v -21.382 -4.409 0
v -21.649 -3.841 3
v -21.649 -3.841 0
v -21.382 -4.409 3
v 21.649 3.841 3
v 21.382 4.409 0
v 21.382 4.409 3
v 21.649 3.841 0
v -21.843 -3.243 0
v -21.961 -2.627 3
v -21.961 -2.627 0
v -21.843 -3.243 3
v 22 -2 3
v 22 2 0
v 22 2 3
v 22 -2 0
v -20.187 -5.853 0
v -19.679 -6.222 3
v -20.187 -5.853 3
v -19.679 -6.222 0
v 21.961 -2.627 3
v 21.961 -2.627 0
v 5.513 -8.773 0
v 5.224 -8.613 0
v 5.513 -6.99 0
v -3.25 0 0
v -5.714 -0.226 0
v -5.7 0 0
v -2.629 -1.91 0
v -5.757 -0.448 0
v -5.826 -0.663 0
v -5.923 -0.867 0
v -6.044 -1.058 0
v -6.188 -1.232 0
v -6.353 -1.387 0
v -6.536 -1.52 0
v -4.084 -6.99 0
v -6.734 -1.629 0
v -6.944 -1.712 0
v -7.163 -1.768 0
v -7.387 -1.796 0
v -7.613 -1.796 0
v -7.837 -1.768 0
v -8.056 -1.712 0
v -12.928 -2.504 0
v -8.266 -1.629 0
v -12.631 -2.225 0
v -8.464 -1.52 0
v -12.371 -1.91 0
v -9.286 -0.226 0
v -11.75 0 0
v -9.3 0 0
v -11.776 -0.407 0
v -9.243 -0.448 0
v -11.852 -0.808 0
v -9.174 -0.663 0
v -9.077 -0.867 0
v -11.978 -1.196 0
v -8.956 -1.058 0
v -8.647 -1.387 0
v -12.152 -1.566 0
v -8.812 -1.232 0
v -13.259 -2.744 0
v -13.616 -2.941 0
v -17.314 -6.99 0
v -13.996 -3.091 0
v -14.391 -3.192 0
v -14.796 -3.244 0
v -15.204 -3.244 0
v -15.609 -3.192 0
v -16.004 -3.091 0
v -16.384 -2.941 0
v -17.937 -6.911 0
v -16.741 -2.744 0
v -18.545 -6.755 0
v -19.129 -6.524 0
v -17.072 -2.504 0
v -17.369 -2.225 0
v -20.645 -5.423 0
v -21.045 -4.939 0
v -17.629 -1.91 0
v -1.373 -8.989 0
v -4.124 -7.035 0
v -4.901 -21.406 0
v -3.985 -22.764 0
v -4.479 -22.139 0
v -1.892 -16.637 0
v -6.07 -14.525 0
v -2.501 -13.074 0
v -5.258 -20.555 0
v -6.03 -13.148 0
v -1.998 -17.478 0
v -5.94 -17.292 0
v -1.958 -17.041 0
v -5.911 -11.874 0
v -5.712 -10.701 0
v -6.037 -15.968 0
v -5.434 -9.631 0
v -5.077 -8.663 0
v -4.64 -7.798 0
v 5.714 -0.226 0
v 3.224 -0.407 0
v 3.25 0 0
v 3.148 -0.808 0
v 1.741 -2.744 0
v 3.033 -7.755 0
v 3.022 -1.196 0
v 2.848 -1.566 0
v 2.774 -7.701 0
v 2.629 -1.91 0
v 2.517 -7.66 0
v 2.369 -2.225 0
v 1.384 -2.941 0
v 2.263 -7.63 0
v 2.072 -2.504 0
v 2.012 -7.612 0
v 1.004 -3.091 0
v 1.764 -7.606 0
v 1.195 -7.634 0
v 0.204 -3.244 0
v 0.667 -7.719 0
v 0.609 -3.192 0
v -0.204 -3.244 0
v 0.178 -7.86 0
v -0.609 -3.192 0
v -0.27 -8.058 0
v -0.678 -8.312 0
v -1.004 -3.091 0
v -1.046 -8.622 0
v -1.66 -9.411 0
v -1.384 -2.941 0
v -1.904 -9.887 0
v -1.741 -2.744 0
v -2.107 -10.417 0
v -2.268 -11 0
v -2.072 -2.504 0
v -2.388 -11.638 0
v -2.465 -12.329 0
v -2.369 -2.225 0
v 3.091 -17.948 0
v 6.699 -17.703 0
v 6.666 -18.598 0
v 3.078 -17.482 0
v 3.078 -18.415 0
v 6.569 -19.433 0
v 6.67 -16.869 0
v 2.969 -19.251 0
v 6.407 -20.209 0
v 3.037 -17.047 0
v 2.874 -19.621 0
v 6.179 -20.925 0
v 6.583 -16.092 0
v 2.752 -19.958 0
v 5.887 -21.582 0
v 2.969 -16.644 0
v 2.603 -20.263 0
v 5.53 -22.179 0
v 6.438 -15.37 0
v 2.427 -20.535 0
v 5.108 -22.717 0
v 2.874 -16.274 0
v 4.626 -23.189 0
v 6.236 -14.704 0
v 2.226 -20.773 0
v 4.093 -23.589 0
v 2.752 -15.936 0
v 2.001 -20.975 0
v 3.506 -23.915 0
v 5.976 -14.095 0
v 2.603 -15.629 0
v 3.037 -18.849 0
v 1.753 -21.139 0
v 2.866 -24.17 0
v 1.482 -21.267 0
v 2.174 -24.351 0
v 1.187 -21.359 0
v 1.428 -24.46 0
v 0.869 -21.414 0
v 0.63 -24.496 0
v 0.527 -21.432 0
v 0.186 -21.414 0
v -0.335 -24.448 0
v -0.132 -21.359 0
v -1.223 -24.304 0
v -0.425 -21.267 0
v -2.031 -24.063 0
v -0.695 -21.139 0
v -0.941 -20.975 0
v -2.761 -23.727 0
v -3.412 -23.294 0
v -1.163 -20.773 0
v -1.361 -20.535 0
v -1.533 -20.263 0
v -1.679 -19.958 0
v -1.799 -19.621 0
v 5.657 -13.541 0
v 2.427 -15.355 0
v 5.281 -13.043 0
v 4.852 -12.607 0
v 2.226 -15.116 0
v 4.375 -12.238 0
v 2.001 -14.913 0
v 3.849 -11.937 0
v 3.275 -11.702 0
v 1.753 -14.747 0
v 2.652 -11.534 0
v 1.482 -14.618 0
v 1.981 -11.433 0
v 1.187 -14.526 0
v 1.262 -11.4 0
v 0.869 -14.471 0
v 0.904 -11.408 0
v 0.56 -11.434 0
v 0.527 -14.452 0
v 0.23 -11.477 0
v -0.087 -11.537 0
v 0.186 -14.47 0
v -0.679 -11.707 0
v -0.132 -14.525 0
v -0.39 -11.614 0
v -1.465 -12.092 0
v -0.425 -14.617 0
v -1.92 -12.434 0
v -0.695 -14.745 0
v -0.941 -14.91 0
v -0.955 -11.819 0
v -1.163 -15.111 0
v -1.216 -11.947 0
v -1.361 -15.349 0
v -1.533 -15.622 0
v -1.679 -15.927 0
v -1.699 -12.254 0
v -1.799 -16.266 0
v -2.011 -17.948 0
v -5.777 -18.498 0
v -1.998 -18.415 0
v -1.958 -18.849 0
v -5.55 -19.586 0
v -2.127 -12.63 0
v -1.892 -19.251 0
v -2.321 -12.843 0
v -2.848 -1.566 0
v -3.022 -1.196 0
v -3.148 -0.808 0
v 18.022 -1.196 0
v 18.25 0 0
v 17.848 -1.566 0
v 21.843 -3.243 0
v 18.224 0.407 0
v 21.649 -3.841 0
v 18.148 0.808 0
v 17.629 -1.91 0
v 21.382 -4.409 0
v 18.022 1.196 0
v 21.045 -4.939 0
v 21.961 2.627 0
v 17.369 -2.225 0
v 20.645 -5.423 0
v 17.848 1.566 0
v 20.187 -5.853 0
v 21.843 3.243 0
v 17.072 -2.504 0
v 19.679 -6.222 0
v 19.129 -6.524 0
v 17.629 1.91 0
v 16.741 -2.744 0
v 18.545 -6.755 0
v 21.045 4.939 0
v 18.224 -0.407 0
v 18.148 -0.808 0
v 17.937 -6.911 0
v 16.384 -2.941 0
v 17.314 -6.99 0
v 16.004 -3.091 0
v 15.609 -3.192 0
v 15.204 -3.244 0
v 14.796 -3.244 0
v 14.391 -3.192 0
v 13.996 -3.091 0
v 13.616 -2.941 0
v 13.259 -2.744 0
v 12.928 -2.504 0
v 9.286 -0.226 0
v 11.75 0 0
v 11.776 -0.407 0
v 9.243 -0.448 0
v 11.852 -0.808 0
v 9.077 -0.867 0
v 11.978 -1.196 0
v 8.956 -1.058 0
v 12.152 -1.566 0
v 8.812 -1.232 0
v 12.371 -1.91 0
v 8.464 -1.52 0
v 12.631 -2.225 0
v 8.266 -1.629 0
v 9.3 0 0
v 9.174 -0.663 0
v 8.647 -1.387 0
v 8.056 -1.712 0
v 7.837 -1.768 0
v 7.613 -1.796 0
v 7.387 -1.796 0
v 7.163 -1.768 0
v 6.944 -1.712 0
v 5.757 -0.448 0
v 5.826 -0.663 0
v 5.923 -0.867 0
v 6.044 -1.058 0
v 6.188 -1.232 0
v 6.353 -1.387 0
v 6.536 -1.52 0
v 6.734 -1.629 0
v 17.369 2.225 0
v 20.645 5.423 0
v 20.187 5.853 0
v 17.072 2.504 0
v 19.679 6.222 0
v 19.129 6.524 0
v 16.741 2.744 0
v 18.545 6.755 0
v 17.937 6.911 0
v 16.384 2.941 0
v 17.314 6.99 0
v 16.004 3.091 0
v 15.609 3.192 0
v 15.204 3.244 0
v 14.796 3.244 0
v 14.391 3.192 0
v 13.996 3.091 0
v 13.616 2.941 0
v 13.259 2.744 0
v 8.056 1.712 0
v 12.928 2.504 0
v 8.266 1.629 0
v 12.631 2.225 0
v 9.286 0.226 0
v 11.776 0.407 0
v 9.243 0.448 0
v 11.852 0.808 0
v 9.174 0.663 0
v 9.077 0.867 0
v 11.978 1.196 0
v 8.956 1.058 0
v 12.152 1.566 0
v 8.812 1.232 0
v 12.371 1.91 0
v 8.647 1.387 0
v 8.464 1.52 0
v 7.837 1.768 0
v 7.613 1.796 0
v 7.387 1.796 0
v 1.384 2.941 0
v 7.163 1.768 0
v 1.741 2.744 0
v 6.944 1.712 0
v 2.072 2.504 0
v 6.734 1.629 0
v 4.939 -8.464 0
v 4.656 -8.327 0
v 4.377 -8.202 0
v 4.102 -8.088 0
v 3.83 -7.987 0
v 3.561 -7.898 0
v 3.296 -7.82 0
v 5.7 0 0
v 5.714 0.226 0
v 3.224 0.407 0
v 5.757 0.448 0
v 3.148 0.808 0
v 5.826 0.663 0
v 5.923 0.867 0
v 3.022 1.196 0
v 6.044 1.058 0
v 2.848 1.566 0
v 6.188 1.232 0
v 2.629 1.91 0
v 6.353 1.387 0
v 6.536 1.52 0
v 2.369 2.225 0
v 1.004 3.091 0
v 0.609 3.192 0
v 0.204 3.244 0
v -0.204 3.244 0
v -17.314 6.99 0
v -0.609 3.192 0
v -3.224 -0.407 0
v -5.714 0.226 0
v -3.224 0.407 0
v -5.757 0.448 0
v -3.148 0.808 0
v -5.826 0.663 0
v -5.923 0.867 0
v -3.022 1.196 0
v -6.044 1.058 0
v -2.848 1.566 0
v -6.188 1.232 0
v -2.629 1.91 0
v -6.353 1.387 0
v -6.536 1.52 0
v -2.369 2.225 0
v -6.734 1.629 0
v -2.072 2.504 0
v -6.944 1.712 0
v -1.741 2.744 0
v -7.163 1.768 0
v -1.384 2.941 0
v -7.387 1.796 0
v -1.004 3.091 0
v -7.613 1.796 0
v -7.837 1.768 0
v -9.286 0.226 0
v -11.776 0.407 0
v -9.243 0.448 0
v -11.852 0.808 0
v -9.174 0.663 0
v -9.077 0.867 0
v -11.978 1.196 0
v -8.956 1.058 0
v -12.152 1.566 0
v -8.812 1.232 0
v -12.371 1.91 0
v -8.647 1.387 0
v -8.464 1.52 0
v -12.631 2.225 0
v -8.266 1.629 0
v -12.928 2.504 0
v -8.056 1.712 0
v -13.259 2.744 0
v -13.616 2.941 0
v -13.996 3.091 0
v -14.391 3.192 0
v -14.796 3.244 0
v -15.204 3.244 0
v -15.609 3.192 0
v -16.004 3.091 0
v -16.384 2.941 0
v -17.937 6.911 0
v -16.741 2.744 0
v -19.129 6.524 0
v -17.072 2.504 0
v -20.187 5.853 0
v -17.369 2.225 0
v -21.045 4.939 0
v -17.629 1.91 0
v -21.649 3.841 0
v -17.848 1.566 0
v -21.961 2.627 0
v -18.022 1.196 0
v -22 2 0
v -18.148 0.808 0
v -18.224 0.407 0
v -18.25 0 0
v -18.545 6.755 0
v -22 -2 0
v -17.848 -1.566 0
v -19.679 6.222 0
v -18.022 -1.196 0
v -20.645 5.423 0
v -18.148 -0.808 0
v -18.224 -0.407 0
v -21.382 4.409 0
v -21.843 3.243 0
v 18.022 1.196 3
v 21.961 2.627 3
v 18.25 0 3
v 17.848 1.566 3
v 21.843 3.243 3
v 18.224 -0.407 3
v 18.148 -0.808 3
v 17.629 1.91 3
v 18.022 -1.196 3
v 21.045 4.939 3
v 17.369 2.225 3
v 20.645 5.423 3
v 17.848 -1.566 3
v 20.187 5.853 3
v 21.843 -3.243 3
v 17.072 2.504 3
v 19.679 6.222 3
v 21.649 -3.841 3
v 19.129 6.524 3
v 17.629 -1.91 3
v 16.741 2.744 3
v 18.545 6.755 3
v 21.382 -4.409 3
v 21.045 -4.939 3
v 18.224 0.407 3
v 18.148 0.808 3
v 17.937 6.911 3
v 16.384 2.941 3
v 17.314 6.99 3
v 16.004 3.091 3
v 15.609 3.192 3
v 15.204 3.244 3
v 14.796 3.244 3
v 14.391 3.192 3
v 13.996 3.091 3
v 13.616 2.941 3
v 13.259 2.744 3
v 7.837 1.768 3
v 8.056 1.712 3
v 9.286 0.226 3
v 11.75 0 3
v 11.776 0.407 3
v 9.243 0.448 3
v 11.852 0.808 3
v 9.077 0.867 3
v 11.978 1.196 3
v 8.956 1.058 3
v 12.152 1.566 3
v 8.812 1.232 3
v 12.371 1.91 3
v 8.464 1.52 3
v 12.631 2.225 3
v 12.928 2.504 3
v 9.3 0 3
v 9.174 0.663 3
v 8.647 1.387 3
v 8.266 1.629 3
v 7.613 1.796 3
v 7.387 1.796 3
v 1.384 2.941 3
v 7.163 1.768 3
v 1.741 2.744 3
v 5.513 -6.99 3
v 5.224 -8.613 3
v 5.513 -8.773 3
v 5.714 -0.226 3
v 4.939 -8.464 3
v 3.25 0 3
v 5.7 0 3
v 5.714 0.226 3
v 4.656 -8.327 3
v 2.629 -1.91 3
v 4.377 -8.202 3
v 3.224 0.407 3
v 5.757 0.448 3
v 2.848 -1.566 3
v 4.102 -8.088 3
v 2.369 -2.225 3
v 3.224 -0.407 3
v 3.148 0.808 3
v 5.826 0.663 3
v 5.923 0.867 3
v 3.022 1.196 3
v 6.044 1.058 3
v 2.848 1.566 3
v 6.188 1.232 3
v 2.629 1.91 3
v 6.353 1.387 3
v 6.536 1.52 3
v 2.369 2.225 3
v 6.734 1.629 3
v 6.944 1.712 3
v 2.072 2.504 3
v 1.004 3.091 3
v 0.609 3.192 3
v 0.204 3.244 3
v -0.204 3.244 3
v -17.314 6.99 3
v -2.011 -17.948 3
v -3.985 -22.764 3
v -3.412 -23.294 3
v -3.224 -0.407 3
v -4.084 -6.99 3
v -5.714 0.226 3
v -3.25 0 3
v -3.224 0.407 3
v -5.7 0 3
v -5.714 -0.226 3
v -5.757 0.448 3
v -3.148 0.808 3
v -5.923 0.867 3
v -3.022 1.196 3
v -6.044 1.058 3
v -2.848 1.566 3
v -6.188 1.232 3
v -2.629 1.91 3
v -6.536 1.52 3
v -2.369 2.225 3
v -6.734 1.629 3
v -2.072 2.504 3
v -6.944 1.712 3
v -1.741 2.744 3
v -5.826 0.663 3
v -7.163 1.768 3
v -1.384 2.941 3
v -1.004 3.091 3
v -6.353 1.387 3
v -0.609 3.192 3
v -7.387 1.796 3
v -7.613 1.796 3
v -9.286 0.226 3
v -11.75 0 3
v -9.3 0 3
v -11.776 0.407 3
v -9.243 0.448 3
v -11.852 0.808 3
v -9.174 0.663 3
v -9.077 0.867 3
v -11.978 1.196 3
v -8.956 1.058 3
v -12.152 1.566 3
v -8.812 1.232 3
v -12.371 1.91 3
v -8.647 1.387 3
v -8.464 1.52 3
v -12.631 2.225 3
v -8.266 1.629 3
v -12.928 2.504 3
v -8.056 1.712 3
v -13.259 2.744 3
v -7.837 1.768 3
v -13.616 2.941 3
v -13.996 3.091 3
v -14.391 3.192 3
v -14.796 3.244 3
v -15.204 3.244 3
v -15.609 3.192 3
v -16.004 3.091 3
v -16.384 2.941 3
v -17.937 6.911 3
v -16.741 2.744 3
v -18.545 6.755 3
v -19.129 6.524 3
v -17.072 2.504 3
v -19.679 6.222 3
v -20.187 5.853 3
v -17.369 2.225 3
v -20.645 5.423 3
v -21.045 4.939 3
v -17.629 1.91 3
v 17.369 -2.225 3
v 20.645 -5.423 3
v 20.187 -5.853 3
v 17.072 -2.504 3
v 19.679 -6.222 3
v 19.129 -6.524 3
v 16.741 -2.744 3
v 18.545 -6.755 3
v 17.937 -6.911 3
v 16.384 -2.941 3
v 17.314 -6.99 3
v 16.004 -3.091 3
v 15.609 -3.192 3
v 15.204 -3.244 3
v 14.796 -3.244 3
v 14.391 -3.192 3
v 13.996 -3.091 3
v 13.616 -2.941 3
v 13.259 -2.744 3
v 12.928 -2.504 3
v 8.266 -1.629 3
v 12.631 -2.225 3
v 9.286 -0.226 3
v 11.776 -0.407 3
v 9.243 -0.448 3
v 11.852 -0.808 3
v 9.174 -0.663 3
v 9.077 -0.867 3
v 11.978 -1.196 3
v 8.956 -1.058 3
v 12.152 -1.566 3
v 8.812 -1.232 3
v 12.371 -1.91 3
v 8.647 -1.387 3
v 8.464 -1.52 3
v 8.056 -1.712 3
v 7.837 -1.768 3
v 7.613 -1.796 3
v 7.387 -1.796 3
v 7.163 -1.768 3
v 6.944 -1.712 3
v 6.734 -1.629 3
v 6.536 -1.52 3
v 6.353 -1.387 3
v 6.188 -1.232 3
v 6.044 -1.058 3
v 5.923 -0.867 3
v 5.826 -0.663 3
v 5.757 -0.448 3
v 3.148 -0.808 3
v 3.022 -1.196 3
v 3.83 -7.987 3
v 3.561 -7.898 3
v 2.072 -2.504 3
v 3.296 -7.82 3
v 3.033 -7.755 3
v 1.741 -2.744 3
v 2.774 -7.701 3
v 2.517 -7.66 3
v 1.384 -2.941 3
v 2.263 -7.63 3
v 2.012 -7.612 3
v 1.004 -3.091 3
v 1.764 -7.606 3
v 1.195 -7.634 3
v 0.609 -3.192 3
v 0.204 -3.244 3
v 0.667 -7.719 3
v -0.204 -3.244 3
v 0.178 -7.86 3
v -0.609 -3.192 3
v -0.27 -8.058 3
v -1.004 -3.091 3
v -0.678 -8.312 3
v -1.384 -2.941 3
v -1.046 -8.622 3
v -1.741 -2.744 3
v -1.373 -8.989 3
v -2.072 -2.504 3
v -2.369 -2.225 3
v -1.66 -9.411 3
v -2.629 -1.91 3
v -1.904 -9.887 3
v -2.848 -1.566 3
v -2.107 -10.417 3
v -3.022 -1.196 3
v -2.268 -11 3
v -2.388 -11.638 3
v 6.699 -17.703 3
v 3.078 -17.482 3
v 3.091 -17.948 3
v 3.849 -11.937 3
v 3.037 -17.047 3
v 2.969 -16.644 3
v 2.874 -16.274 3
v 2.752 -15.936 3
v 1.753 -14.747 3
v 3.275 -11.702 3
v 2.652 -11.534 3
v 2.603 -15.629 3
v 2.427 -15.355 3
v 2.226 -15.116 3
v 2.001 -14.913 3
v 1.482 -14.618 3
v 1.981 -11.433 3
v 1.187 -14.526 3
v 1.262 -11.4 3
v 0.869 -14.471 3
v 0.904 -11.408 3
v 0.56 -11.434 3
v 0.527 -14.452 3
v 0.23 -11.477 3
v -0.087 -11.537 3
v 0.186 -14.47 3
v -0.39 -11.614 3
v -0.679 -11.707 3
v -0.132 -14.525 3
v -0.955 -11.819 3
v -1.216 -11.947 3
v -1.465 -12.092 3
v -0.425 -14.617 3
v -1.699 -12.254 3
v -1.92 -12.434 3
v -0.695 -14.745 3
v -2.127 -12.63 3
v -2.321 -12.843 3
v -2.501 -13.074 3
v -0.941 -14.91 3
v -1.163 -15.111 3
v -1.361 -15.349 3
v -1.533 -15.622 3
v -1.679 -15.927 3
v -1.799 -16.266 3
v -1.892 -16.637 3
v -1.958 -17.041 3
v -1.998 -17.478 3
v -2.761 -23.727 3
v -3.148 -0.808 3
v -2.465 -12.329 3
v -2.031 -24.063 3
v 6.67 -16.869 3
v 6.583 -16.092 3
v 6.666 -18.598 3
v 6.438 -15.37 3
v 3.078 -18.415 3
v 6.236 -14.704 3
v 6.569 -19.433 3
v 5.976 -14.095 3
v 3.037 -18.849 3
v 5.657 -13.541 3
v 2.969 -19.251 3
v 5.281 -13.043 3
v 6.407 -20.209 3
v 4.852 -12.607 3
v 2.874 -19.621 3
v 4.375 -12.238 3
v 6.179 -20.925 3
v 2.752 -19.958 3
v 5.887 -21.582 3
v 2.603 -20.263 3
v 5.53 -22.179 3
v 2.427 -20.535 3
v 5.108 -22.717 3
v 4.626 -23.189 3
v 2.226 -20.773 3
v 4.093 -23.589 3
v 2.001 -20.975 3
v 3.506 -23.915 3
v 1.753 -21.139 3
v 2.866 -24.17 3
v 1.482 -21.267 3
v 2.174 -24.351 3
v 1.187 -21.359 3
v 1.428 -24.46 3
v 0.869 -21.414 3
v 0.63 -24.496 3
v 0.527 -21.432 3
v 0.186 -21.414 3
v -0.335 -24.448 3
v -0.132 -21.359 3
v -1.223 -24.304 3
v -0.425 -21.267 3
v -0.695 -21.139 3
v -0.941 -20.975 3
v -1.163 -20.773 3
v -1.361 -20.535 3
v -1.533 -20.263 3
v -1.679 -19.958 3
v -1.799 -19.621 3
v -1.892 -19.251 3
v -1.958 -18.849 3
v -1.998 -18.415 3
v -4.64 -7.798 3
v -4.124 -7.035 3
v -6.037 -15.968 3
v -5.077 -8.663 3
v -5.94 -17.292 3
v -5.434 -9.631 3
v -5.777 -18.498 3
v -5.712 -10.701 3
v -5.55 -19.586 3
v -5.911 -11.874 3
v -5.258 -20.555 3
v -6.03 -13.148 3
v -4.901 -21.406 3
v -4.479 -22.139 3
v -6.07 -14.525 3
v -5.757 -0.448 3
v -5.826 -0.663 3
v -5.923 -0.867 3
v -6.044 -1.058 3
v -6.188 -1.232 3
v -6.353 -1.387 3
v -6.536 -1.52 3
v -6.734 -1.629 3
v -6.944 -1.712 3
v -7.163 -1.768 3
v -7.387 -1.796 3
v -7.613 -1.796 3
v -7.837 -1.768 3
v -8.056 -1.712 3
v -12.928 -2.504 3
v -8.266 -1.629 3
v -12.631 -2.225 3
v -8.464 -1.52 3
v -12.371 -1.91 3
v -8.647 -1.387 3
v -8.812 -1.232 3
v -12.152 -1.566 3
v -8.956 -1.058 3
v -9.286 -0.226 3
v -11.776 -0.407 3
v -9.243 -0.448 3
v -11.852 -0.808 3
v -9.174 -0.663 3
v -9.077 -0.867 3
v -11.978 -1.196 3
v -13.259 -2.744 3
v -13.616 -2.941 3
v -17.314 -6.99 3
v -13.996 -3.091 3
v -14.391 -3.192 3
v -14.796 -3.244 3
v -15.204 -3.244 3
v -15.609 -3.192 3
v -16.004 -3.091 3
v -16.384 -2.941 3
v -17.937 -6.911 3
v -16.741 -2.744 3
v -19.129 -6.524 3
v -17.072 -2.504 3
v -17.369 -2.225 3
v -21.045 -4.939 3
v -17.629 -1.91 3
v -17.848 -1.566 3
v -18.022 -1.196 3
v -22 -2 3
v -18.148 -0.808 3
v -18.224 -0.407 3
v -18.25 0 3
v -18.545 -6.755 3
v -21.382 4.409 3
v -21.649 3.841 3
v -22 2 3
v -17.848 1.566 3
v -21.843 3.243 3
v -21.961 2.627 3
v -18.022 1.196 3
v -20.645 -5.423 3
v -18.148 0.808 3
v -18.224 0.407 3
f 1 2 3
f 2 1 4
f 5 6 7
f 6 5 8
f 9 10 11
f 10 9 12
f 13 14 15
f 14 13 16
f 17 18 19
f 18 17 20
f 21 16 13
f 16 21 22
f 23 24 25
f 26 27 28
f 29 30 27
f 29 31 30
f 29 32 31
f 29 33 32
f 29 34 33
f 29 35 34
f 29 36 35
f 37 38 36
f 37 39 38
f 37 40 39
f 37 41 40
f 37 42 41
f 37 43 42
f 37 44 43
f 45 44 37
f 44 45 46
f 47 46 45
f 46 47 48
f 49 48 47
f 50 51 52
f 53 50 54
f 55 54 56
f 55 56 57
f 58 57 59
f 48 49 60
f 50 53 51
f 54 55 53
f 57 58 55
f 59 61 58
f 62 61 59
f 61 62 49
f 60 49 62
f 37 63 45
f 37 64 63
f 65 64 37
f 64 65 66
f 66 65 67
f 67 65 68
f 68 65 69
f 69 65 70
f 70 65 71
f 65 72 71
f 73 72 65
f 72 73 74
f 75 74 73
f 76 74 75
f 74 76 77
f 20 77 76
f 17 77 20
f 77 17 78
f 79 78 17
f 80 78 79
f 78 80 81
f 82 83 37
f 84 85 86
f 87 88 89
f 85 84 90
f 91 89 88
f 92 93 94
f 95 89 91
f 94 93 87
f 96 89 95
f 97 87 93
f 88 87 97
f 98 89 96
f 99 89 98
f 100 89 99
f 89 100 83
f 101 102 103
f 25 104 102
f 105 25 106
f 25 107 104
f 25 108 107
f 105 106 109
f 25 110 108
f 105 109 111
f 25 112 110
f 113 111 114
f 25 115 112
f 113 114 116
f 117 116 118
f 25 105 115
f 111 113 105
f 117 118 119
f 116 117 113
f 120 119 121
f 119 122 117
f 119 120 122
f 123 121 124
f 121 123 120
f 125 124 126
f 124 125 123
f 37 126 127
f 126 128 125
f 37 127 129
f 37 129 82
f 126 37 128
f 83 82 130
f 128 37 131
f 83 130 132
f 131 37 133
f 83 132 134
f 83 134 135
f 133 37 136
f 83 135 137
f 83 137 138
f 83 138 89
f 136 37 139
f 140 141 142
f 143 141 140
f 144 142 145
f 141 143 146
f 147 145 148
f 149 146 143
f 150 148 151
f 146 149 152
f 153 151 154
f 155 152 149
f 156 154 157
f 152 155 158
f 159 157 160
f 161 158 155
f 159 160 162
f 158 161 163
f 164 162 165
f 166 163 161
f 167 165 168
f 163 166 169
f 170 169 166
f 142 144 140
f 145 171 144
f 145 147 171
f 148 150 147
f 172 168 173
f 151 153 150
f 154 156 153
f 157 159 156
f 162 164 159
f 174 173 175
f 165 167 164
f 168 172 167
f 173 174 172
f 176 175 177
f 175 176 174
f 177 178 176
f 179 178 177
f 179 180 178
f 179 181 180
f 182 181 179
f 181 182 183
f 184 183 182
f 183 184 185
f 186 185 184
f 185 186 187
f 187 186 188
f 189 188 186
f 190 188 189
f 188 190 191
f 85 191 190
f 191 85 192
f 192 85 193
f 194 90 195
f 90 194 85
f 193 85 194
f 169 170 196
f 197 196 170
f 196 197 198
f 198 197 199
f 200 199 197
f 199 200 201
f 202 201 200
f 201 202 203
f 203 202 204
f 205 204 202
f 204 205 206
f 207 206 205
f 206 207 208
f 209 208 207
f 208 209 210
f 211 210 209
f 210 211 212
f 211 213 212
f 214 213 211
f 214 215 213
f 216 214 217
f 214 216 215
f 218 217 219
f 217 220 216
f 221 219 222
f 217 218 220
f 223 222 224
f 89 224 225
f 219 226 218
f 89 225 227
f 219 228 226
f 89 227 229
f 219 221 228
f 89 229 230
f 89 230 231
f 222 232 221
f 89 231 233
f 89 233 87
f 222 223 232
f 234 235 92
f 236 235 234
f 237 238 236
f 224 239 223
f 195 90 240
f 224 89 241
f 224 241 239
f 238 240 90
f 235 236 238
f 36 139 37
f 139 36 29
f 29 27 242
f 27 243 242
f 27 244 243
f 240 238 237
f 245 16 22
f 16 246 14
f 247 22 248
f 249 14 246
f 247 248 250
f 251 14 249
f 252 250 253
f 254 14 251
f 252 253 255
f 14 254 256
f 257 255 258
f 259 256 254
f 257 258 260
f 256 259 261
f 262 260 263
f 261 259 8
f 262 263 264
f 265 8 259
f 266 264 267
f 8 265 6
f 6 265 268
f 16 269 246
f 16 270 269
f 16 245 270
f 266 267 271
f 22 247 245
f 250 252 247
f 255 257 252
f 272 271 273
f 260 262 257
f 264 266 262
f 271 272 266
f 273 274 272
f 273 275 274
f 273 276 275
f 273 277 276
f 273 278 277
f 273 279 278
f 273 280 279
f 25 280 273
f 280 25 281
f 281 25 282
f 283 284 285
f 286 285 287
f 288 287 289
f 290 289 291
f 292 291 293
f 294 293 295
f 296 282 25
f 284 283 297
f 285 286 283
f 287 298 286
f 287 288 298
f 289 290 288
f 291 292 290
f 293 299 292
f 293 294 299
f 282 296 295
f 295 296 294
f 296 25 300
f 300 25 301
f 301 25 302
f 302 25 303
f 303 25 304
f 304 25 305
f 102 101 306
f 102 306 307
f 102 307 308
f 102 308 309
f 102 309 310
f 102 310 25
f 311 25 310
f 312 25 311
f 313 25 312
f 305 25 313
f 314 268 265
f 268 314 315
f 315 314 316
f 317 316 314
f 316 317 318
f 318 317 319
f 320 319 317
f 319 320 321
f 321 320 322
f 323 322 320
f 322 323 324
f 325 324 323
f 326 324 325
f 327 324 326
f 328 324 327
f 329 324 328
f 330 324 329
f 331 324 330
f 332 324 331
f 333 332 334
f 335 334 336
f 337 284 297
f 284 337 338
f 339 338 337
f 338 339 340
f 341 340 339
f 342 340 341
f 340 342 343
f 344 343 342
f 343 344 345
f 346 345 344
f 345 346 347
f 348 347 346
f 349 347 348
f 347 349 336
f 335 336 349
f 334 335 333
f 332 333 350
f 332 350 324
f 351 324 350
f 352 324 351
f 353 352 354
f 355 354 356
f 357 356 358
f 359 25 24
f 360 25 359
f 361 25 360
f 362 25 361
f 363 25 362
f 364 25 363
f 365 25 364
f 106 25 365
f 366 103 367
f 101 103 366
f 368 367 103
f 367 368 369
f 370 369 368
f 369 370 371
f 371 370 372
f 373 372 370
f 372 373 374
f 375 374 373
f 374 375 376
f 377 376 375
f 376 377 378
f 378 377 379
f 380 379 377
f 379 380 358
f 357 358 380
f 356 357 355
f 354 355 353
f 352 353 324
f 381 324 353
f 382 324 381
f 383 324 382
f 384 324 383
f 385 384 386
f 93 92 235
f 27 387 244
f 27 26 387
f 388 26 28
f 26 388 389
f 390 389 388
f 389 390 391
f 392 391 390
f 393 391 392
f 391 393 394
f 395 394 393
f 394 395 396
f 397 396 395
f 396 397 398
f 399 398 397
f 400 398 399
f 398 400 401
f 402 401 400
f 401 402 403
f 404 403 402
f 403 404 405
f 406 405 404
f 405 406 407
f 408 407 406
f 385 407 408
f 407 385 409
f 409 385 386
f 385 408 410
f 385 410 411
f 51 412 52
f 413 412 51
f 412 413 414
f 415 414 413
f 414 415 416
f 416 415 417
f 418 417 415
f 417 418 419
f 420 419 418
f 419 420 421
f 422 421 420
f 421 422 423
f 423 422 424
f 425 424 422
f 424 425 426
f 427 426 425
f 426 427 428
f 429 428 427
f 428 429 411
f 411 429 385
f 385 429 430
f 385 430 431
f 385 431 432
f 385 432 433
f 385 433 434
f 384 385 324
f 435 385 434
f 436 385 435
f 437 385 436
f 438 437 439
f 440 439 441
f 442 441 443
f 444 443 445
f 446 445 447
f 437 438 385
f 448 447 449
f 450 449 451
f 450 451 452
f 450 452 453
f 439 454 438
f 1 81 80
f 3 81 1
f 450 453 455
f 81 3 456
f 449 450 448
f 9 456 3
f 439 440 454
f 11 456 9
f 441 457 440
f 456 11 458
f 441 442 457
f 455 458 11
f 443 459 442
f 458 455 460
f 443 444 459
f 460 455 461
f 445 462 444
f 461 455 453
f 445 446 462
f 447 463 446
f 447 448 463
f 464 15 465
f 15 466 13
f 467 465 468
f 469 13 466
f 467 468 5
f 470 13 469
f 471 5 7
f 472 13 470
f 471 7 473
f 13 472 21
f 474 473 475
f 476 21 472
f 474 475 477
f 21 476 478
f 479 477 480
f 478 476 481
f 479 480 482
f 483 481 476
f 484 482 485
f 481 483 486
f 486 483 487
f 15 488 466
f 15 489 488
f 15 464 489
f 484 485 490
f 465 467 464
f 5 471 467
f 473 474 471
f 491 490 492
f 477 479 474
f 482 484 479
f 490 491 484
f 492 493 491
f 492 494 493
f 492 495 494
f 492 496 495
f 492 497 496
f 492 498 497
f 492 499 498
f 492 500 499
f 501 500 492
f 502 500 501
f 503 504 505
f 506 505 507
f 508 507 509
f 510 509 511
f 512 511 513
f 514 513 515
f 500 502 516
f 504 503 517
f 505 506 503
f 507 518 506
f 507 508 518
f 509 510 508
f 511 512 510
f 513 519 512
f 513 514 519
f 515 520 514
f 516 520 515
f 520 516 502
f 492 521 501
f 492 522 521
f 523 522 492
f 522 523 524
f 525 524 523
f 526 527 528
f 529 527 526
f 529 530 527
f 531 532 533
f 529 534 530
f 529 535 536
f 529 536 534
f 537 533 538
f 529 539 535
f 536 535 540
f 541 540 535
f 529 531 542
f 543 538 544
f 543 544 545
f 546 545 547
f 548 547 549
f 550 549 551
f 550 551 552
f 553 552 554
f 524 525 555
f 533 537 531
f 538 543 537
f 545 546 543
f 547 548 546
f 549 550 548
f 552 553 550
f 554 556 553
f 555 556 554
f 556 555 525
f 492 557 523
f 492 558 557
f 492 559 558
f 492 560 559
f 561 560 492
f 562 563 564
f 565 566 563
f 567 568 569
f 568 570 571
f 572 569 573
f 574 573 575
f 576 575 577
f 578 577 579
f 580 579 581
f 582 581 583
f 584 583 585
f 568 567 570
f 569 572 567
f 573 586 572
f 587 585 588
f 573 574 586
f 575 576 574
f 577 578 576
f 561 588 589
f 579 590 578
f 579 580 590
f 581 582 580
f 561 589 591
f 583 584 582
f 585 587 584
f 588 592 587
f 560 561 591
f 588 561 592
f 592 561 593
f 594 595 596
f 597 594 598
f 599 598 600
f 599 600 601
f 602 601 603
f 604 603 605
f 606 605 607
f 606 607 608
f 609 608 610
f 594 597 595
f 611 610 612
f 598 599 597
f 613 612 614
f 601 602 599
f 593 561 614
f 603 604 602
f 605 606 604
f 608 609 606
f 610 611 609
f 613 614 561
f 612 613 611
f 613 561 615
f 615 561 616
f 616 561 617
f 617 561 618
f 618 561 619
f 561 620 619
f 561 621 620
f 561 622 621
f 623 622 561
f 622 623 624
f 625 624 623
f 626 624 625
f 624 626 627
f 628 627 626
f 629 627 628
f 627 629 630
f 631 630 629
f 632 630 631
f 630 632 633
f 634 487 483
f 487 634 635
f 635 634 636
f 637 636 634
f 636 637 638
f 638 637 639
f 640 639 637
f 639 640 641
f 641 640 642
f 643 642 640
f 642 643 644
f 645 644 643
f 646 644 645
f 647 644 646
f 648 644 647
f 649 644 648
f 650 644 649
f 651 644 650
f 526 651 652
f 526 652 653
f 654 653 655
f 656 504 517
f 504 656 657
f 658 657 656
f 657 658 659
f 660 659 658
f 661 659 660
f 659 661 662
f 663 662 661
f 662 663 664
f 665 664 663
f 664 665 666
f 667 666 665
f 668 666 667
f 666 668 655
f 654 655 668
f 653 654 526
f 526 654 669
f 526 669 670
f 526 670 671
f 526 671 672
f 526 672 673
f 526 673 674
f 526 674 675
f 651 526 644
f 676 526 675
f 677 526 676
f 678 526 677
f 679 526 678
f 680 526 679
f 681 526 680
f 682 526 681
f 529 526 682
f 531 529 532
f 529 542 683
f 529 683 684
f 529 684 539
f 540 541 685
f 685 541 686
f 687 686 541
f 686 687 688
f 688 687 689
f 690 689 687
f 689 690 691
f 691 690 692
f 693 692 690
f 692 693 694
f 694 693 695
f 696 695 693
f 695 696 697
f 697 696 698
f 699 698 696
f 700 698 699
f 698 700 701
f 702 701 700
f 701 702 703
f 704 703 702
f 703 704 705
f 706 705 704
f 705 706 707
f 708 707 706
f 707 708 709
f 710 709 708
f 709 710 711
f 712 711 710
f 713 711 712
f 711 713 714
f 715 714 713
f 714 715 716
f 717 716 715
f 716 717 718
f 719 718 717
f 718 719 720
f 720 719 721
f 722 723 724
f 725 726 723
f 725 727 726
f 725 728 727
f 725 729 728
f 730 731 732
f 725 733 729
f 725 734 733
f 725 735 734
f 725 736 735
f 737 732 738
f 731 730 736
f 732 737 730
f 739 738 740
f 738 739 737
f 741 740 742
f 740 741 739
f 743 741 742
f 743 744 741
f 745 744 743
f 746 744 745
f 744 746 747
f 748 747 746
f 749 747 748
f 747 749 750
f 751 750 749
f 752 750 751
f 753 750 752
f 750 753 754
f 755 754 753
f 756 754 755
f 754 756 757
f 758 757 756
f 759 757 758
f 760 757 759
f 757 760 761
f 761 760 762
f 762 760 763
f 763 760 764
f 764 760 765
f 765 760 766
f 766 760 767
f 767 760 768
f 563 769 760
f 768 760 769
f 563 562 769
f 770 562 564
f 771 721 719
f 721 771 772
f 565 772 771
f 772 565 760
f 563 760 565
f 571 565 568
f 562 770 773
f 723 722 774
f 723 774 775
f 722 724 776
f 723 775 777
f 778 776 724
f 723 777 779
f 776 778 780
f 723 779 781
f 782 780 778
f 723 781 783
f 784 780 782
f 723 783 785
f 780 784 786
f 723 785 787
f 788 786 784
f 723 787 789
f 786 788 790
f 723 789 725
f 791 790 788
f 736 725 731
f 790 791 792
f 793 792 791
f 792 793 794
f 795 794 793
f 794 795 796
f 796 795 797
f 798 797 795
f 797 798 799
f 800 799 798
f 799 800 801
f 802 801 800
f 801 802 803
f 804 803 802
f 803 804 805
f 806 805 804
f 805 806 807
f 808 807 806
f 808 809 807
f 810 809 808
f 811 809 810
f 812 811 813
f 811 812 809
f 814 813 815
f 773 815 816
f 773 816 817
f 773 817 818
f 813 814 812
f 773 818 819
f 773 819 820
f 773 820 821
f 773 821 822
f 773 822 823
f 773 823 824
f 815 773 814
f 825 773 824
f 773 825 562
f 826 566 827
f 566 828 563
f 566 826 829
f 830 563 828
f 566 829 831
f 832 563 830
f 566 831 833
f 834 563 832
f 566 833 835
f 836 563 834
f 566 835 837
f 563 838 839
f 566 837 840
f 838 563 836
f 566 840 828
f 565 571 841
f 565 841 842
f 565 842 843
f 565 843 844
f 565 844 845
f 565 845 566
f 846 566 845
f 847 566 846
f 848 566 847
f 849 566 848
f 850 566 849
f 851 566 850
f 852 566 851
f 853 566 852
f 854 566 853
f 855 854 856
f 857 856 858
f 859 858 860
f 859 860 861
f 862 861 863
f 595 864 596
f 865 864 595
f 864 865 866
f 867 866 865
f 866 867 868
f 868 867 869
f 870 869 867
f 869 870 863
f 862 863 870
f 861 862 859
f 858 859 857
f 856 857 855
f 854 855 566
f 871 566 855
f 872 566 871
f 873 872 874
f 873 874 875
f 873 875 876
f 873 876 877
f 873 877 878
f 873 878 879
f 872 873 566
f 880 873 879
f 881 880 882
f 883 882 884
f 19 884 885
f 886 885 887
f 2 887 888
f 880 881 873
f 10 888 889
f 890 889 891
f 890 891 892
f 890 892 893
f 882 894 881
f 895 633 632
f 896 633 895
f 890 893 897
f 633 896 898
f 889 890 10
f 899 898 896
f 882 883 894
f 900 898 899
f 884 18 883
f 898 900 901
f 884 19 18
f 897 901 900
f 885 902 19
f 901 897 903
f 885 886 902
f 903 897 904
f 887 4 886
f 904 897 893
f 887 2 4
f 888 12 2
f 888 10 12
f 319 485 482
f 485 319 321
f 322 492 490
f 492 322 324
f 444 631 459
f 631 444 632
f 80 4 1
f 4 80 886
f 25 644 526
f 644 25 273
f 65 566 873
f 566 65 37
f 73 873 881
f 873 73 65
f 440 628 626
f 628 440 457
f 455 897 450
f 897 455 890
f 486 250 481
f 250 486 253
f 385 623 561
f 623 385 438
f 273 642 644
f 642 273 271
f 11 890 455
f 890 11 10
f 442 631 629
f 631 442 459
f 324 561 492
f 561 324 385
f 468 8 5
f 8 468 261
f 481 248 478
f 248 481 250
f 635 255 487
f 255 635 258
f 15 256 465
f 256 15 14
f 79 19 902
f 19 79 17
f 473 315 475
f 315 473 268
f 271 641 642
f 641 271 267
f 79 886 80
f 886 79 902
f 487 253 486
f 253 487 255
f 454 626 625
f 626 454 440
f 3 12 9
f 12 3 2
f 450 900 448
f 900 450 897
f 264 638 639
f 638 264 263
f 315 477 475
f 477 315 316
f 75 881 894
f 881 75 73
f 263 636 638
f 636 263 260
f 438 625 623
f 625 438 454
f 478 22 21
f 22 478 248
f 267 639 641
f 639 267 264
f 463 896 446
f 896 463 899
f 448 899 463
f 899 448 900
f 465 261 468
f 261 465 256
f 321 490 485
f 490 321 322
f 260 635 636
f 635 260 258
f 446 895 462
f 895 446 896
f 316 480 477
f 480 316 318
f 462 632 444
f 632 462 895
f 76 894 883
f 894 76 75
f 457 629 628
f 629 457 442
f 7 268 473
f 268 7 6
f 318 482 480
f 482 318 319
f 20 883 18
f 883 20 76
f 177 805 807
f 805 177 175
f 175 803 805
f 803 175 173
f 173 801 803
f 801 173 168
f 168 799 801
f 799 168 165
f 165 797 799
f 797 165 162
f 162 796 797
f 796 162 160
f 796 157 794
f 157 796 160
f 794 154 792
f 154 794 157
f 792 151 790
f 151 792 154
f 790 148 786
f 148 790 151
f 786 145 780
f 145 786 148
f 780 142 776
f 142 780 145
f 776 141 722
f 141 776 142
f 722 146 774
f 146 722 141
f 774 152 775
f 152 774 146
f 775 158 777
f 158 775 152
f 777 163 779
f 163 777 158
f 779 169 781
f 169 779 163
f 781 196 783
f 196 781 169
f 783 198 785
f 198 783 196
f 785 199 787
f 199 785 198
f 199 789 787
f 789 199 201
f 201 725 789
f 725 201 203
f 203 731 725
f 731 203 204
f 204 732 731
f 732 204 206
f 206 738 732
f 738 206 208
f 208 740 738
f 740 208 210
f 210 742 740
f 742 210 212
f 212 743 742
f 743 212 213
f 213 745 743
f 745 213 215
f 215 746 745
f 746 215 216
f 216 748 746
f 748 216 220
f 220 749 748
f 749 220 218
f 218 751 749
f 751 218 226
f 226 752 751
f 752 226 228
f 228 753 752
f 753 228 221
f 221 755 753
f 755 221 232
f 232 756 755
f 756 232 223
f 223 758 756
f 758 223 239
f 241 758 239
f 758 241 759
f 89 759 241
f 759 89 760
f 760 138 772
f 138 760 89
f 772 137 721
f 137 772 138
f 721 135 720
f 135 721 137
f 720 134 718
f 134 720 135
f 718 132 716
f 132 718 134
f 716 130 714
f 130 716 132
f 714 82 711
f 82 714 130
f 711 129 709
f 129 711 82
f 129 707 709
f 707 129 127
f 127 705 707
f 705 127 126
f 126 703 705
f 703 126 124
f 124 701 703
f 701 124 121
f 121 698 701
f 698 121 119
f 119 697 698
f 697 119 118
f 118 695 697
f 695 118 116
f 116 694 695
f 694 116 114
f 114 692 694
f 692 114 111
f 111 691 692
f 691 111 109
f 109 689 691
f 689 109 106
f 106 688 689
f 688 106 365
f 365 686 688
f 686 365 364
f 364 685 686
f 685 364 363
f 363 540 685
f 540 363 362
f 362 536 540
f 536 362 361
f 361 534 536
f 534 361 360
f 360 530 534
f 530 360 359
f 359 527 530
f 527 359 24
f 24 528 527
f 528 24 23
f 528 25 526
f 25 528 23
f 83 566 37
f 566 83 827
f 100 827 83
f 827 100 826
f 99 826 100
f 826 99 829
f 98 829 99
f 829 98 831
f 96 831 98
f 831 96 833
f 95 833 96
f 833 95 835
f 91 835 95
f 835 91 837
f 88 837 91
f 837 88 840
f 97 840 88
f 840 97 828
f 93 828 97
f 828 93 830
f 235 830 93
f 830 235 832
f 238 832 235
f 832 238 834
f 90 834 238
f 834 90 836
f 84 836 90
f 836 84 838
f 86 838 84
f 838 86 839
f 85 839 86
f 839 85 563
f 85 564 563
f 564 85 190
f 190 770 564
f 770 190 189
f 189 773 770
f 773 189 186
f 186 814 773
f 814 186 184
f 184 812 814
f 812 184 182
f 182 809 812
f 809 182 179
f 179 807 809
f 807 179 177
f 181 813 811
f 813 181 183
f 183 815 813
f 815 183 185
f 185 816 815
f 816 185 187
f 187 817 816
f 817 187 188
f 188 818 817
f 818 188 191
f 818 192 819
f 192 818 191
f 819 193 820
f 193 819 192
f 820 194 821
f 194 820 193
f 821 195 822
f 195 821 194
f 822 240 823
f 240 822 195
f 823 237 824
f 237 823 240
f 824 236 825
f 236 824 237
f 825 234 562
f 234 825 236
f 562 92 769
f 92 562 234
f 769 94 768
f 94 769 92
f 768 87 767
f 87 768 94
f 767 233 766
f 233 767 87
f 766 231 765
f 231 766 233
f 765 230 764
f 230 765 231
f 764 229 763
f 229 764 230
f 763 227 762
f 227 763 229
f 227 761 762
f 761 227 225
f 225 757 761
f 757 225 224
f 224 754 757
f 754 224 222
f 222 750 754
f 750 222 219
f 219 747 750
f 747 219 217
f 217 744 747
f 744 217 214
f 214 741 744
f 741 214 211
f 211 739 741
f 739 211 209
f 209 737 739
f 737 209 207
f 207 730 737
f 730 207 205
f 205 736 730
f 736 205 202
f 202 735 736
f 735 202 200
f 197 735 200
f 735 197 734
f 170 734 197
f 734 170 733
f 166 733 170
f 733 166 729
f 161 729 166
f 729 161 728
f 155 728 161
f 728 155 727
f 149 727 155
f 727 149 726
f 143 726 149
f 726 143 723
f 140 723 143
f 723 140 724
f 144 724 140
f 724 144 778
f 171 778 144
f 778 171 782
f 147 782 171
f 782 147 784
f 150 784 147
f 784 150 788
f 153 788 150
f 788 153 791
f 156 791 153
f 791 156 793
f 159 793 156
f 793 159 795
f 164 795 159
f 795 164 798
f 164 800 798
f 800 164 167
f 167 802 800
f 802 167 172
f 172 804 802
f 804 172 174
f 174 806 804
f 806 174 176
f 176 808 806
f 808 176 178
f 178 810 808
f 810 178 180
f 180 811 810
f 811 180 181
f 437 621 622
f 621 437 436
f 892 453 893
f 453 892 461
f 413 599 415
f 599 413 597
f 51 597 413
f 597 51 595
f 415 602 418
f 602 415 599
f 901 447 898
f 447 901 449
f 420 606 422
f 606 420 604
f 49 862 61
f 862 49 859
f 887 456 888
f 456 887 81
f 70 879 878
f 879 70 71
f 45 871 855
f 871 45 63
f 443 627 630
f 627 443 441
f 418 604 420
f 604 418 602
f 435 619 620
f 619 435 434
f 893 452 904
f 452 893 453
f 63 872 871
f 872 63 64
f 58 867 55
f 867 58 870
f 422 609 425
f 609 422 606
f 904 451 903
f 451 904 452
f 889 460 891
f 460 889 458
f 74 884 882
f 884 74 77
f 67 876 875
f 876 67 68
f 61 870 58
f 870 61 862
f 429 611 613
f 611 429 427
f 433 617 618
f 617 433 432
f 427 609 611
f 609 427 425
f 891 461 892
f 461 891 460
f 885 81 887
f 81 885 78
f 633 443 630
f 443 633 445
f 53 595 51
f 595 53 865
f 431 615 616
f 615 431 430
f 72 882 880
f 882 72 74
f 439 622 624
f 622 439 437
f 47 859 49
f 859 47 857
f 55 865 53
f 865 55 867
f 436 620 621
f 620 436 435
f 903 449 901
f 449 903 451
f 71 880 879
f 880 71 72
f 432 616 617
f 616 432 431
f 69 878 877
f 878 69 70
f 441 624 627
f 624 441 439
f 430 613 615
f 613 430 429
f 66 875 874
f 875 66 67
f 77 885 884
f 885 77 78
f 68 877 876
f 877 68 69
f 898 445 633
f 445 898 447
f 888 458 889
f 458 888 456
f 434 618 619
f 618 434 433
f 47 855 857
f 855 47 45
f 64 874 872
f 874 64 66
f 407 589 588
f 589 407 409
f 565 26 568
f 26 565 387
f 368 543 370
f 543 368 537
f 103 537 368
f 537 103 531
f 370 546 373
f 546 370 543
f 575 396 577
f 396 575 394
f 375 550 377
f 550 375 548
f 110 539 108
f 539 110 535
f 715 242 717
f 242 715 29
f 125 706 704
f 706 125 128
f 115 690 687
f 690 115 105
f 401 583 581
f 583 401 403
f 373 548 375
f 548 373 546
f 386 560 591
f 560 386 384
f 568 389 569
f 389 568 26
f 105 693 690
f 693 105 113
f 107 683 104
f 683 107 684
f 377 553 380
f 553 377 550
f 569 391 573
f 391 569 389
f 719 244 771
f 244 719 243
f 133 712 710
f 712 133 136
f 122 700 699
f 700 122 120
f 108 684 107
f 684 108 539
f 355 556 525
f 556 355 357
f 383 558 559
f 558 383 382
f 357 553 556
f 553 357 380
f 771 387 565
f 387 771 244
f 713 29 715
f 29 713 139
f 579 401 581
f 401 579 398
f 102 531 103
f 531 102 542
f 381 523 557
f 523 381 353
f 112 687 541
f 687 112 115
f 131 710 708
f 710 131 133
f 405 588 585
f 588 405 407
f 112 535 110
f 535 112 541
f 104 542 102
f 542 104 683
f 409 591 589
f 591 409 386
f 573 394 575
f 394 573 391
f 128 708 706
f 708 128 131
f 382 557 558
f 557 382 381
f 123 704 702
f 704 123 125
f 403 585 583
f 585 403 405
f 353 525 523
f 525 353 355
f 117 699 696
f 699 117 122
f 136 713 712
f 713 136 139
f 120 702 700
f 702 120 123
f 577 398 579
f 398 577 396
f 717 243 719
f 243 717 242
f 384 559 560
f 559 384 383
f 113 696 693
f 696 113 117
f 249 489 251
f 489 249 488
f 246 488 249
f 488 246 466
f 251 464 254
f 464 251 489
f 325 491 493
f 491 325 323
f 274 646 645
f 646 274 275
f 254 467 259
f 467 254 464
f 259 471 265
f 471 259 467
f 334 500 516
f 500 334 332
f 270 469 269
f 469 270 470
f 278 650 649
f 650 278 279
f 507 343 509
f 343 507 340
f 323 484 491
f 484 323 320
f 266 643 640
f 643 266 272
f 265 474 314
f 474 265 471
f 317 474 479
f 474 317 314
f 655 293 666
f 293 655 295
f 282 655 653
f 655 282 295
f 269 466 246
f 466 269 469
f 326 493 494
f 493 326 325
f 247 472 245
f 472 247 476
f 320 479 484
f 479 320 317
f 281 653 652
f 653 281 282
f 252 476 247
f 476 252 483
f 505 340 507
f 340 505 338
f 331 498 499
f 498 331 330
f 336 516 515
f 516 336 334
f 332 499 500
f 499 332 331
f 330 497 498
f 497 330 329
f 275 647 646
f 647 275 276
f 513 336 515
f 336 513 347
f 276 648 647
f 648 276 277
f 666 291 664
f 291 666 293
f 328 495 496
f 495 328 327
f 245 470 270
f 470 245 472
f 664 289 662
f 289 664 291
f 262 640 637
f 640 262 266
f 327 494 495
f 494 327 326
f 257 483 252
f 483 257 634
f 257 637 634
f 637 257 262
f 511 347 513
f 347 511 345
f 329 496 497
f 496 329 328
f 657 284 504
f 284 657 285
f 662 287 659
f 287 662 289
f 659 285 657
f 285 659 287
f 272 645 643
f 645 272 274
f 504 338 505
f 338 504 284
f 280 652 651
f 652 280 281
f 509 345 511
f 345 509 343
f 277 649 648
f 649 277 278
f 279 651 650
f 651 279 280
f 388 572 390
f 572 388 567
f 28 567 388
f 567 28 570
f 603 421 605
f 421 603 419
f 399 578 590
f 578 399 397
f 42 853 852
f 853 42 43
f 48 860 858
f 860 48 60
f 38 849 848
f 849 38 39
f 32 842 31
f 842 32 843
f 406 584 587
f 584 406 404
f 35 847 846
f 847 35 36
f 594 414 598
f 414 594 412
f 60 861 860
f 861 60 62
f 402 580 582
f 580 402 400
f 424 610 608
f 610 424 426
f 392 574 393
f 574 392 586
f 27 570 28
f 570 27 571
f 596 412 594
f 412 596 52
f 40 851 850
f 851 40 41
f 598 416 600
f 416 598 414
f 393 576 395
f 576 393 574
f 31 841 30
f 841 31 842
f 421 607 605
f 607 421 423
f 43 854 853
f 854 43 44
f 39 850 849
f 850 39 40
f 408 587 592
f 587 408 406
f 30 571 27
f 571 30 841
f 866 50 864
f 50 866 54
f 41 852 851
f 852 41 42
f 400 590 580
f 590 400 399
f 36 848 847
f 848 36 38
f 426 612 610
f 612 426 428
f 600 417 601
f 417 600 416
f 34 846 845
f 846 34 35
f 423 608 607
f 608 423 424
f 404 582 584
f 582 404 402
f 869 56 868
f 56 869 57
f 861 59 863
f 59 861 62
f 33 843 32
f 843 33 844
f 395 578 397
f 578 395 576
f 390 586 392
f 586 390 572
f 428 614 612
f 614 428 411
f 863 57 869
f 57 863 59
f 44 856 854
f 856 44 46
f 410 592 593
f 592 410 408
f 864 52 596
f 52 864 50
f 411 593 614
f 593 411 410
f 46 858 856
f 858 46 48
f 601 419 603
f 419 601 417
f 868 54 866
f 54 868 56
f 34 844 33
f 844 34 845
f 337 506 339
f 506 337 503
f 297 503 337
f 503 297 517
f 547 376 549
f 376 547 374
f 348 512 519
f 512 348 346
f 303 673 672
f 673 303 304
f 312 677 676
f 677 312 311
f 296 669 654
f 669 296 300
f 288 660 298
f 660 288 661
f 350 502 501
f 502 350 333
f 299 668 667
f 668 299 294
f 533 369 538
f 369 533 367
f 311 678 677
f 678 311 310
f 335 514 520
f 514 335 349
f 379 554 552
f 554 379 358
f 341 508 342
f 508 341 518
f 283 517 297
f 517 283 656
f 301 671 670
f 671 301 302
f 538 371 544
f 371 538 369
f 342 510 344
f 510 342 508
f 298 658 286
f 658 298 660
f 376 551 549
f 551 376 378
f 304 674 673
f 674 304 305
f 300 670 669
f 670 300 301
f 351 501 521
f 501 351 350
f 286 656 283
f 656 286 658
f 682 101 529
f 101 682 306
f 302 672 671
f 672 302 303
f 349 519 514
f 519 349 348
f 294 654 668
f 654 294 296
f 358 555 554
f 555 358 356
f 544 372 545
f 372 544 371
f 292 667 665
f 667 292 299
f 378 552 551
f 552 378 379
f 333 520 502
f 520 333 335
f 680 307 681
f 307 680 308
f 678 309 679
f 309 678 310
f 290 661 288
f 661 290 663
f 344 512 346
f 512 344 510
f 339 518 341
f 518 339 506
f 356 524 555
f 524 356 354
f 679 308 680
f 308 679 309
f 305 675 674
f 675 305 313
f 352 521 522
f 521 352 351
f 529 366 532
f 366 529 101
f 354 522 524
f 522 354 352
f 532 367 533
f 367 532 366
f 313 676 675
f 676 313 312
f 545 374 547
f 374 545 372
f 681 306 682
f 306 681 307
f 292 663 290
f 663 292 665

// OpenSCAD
$fn = 50;


difference() {
	union() {
		hull() {
			translate(v = [-17.0000000000, 2.0000000000, 0]) {
				cylinder(h = 3, r = 5);
			}
			translate(v = [17.0000000000, 2.0000000000, 0]) {
				cylinder(h = 3, r = 5);
			}
			translate(v = [-17.0000000000, -2.0000000000, 0]) {
				cylinder(h = 3, r = 5);
			}
			translate(v = [17.0000000000, -2.0000000000, 0]) {
				cylinder(h = 3, r = 5);
			}
		}
		translate(v = [0, -5, 0]) {
			linear_extrude(height = 3) {
				text(font = "DejaVu Sans Mono:style=Bold", halign = "center", size = 19.0000000000, text = "6", valign = "top");
			}
		}
	}
	union() {
		translate(v = [-15.0000000000, 0.0000000000, 0]) {
			translate(v = [0, 0, -100]) {
				cylinder(h = 200, r = 3.2500000000);
			}
		}
		translate(v = [0, 0, -100]) {
			cylinder(h = 200, r = 3.2500000000);
		}
		translate(v = [15.0000000000, 0.0000000000, 0]) {
			translate(v = [0, 0, -100]) {
				cylinder(h = 200, r = 3.2500000000);
			}
		}
		translate(v = [-15.0000000000, 0.0000000000, 0]) {
			translate(v = [0, 0, -100]) {
				cylinder(h = 200, r = 1.8000000000);
			}
		}
		translate(v = [-7.5000000000, 0.0000000000, 0]) {
			translate(v = [0, 0, -100]) {
				cylinder(h = 200, r = 1.8000000000);
			}
		}
		translate(v = [0, 0, -100]) {
			cylinder(h = 200, r = 1.8000000000);
		}
		translate(v = [7.5000000000, 0.0000000000, 0]) {
			translate(v = [0, 0, -100]) {
				cylinder(h = 200, r = 1.8000000000);
			}
		}
		translate(v = [15.0000000000, 0.0000000000, 0]) {
			translate(v = [0, 0, -100]) {
				cylinder(h = 200, r = 1.8000000000);
			}
		}
	}
}
